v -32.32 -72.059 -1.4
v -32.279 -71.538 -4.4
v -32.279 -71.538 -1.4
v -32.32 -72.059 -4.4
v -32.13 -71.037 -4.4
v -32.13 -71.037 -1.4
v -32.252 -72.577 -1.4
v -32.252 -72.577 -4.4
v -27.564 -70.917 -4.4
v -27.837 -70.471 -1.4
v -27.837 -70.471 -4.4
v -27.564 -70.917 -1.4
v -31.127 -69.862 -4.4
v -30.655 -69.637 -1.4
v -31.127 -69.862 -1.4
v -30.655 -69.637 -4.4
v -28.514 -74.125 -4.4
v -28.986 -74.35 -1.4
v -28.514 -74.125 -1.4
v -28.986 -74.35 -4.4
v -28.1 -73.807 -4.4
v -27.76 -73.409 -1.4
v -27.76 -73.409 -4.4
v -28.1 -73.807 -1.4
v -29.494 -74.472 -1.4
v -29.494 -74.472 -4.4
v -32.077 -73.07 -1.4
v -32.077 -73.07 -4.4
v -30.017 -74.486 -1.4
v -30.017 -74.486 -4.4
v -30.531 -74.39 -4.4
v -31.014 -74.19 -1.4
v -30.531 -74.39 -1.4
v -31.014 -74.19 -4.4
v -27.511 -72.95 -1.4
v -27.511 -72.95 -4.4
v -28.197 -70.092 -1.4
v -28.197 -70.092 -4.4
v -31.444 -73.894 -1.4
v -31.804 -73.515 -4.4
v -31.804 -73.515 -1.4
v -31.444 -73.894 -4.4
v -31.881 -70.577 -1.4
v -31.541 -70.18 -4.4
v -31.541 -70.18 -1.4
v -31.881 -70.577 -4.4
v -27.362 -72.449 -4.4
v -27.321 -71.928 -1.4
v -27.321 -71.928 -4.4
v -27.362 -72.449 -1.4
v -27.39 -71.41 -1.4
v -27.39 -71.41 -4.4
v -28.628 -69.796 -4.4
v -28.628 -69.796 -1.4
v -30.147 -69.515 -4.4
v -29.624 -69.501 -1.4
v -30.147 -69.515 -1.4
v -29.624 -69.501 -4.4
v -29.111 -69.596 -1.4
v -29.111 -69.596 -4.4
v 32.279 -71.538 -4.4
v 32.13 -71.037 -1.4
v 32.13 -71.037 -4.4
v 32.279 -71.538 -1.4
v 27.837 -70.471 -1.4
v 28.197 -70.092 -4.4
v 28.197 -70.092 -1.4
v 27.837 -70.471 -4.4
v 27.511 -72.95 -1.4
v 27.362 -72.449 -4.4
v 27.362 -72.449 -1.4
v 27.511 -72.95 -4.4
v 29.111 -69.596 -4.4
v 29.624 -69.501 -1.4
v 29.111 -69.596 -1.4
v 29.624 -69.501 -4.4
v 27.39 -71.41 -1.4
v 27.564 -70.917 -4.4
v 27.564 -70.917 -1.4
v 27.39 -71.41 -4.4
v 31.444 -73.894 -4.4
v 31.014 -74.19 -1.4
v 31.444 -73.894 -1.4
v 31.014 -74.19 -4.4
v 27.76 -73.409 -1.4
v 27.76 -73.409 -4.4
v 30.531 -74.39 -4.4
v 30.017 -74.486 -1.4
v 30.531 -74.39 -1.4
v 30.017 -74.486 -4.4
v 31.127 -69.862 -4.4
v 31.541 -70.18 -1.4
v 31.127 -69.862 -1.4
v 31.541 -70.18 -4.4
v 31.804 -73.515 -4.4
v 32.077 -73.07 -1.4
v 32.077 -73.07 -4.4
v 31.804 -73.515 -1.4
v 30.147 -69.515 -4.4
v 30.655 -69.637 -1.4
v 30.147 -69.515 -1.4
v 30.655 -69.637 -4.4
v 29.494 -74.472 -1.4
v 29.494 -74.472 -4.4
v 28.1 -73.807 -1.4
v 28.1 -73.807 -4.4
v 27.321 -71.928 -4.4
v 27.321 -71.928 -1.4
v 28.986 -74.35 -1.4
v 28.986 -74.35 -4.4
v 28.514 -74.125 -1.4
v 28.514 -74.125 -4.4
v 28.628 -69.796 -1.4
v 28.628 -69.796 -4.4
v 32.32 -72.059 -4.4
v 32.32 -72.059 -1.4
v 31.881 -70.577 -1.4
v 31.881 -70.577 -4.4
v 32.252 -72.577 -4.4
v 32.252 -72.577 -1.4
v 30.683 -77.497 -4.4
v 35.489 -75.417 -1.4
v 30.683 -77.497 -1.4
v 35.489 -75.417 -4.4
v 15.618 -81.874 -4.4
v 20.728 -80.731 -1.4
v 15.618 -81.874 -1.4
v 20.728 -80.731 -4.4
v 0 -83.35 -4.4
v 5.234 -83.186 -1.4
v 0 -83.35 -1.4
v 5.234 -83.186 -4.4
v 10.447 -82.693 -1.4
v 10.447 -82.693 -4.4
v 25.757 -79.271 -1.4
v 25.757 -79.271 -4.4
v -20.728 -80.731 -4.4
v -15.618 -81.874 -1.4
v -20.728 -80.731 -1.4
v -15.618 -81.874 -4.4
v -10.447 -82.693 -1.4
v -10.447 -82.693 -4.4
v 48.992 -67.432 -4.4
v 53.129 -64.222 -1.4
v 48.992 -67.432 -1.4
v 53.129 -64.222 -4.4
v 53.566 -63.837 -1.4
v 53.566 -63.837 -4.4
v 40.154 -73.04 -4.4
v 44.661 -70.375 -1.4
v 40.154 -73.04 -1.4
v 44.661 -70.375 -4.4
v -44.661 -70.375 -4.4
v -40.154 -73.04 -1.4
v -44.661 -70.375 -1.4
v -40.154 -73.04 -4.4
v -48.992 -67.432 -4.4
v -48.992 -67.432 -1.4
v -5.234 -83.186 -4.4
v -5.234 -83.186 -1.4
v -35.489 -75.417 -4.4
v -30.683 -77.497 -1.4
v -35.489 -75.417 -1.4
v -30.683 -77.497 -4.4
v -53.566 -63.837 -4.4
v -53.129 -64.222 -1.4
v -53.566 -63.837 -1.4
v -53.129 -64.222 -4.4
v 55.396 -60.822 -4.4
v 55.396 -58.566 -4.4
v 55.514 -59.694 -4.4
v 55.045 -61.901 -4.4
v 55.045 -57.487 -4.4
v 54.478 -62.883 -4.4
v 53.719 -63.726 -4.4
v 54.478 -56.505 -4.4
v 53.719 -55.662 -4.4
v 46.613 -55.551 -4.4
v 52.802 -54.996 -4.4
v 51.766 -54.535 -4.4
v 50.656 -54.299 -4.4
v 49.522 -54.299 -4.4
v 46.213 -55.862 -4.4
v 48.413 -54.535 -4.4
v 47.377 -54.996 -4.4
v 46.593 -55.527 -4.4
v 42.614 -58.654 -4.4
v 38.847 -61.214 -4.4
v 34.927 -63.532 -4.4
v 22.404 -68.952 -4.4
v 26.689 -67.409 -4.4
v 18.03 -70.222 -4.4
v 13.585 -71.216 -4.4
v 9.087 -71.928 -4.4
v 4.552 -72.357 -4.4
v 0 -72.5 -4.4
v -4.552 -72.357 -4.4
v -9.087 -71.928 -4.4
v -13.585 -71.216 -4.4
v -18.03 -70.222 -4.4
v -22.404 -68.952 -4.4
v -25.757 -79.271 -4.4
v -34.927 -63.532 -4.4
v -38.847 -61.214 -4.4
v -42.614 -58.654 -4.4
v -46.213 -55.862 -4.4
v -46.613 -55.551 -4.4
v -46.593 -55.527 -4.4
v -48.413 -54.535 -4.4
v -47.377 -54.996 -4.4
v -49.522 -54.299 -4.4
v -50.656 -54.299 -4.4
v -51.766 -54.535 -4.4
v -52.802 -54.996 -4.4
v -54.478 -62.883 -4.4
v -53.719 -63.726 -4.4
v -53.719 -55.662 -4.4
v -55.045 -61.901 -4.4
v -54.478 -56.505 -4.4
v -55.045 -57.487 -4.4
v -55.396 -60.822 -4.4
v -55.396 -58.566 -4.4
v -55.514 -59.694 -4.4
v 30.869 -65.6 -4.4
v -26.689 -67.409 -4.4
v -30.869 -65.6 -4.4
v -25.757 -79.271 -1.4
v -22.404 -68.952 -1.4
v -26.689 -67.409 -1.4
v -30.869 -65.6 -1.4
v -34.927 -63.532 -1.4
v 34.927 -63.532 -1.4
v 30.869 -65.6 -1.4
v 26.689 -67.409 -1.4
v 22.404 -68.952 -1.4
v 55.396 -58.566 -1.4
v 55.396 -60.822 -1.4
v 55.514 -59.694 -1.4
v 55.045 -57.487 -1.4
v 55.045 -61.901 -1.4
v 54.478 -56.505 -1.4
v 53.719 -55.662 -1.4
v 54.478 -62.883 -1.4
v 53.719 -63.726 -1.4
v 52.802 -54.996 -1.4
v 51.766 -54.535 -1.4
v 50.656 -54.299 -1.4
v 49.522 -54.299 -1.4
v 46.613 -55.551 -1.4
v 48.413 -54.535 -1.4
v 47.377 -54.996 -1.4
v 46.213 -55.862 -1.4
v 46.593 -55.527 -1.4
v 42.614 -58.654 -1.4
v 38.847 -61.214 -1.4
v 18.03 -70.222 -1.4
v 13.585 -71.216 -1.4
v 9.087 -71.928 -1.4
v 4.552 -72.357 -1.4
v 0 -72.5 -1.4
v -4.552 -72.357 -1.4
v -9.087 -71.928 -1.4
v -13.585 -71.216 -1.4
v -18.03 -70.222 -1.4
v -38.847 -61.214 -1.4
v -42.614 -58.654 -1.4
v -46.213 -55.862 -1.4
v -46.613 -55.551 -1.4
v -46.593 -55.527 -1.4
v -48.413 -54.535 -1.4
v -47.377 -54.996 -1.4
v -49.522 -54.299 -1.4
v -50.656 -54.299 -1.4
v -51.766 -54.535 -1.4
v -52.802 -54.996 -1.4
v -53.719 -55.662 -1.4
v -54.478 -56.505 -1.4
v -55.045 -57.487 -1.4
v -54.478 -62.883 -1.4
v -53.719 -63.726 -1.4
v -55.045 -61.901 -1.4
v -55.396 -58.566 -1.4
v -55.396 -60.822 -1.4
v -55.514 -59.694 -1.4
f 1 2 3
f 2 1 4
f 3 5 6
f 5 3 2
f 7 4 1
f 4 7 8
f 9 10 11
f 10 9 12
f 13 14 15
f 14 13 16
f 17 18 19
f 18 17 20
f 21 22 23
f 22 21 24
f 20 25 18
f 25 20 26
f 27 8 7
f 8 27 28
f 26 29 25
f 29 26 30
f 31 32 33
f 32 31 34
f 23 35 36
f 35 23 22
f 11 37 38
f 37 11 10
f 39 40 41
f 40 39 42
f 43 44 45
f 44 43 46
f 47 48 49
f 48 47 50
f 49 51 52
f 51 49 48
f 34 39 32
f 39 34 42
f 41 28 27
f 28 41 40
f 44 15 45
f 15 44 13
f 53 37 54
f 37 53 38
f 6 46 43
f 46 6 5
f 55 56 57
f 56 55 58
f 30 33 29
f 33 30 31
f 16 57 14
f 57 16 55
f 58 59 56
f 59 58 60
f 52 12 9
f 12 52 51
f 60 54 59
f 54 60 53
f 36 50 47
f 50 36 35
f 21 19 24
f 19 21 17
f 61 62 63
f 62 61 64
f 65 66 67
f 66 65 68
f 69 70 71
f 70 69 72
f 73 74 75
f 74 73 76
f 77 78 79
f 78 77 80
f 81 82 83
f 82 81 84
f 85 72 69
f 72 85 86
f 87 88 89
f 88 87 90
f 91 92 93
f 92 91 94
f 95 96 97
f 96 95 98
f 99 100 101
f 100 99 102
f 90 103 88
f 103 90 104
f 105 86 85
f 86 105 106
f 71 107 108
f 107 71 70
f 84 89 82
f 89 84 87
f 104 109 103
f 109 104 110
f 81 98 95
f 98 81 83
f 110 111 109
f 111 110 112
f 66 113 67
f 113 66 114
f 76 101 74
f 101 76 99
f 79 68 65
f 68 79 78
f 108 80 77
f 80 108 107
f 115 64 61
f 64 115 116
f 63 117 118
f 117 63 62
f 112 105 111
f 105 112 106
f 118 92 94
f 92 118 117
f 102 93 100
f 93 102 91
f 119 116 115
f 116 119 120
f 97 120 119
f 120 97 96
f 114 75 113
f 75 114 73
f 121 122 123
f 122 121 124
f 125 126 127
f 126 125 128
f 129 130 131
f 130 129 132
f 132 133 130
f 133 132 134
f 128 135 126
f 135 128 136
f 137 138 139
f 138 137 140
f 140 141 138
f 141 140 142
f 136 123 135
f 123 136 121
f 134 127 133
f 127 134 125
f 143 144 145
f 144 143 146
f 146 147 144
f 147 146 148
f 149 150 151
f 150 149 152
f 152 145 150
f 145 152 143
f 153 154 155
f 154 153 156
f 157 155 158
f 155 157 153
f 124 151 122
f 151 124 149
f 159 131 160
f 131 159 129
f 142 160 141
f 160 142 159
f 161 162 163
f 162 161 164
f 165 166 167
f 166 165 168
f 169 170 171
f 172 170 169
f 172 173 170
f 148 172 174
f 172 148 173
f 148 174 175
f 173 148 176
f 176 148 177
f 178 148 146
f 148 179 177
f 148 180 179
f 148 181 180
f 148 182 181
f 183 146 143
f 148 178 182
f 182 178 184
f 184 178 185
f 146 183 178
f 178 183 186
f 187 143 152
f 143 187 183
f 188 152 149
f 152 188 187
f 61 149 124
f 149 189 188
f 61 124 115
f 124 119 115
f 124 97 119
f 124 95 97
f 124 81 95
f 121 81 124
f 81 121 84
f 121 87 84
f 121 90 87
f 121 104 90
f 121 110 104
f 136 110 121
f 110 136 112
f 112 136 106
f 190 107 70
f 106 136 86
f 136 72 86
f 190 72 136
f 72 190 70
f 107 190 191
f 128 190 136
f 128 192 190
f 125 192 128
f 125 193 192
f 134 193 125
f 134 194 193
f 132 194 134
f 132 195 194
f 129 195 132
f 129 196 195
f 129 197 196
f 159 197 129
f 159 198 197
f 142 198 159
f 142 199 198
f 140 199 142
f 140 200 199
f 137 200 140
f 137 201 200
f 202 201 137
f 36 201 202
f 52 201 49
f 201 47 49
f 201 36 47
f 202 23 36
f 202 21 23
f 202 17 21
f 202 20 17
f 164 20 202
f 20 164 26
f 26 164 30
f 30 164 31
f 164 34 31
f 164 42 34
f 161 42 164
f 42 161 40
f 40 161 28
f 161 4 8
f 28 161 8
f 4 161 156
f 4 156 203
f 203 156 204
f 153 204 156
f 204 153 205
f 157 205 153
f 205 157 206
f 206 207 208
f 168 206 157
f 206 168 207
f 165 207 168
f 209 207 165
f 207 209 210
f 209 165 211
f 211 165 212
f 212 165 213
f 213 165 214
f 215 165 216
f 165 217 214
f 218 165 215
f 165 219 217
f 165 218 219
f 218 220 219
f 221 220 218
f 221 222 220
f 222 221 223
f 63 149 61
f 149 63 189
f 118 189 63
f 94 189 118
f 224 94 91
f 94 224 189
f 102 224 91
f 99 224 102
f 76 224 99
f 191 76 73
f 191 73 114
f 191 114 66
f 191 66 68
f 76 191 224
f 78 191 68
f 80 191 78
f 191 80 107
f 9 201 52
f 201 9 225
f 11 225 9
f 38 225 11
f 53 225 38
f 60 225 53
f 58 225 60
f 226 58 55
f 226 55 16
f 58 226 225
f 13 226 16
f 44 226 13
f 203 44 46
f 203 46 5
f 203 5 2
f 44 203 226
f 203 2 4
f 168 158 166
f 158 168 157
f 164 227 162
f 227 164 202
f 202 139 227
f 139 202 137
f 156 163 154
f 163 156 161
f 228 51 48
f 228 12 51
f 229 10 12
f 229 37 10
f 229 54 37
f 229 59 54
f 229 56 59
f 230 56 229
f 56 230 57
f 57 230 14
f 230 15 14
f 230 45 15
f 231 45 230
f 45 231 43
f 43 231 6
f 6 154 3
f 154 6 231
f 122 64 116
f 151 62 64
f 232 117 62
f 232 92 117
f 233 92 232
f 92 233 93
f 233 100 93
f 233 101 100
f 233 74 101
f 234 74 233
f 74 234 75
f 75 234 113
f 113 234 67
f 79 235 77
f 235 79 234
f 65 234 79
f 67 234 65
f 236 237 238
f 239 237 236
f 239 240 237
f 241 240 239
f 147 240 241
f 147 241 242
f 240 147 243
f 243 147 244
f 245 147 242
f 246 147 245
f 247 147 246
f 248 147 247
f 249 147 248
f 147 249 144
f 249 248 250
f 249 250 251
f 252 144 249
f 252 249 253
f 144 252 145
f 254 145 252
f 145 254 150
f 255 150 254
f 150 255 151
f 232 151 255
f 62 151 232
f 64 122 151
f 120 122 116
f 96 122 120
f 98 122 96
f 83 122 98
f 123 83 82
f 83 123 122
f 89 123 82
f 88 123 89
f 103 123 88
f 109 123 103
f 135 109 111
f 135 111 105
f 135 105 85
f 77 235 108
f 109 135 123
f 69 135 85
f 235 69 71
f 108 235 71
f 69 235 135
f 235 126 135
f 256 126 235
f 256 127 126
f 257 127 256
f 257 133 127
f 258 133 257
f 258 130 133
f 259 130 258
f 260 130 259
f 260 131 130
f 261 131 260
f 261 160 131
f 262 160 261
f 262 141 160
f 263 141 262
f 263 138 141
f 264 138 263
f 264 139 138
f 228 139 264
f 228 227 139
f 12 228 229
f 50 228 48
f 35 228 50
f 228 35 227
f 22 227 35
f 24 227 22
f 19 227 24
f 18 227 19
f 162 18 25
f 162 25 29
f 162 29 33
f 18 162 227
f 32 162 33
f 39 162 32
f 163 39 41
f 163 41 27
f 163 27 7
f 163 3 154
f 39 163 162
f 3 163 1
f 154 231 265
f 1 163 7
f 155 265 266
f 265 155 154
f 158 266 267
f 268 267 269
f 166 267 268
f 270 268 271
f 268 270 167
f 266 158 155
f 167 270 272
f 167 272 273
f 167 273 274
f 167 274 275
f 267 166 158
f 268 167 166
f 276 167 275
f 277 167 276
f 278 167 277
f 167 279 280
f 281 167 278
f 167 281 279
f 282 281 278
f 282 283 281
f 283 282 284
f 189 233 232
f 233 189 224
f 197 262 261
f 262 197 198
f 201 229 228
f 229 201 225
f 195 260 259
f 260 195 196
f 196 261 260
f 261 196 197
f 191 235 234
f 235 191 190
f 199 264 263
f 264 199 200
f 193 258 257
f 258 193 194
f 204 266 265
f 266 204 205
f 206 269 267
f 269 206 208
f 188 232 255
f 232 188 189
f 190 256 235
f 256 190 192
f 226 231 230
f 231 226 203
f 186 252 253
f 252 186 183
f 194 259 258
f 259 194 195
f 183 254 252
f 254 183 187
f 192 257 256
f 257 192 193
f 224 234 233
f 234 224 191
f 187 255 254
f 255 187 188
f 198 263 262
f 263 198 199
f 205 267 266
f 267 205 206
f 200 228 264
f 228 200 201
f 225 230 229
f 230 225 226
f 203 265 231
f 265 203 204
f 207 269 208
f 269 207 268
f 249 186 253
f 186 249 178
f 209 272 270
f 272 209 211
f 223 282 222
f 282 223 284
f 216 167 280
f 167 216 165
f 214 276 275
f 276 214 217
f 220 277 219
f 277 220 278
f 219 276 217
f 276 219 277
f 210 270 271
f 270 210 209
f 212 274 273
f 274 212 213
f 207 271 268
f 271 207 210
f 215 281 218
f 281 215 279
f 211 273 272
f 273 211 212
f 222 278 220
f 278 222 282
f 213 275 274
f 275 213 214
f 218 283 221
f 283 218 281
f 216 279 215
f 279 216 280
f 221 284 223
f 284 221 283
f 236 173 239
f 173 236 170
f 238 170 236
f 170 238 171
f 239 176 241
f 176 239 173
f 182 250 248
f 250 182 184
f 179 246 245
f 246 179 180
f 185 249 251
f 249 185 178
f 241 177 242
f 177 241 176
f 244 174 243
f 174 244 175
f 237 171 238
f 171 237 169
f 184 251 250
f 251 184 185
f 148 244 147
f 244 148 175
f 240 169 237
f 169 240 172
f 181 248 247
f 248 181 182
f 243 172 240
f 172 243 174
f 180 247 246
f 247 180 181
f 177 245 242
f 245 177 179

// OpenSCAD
luminaria_d = 174 - 6 + 3 + 1.2 - 1 - 0.5;
pele_d = 160;
pele_z = 0.4;

disco_d = 145;
disco_z = 15;

juntas_z = 15;
juntas_x = 20;
juntas_y = luminaria_d - disco_d;

estrut_z = juntas_z;
estrut_x = 20;
estrut_y = luminaria_d - disco_d;
estrut_n = 4;
estrut_theta_0 = 180 / estrut_n;

moldura_d = 165;
moldura_z = juntas_z;
moldura_x = 20;
moldura_y = luminaria_d - disco_d;
moldura_n = 8;
moldura_theta_0 = 180 / moldura_n;

trava_z = 3;
trava_theta = 80;
trava_d = luminaria_d - 4;

montagem_delta = 0.5;

furos_d = 3.8;

module conexao(){
    difference(){
        intersection(){
            difference(){
                union(){
                    cylinder( d = luminaria_d, h = disco_z, $fn = 100 );
                    
//                    // Juntas para as metades (não cabe inteira na impressora):
//                    translate( [ -juntas_x / 2, -luminaria_d / 2, 0 ] )
//                        cube( [ juntas_x, juntas_y, juntas_z + disco_z ] );
//                    translate( [ -juntas_x / 2, luminaria_d / 2 - juntas_y, 0 ] )
//                        cube( [ juntas_x, juntas_y, juntas_z + disco_z ] );
                    
                    // Abas estruturais para unir moldura ao barril:
                    for ( i = [ 0 : estrut_n - 1 ] )
                            rotate( estrut_theta_0 + 360 / estrut_n * i, [ 0, 0, 1 ] )
                                translate( [ -estrut_x / 2, -luminaria_d / 2, 0 ] )
//                                    cube( [ estrut_x, estrut_y, estrut_z + disco_z ] );
                                    cube( [ estrut_x, estrut_y, estrut_z ] );
    
                    // Abas para unir moldura à pela:
                    for ( i = [ 0 : moldura_n - 1 ] )
                            rotate( moldura_theta_0 + 360 / moldura_n * i, [ 0, 0, 1 ] )
                                translate( [ -moldura_x / 2, -luminaria_d / 2, 0 ] )
//                                    cube( [ moldura_x, moldura_y, moldura_z + disco_z ] );
                                    cube( [ moldura_x, moldura_y, moldura_z ] );
                }
                
                translate( [ 0, 0, -1 ] )
                    cylinder( d = disco_d, h = 100 * disco_z + 2, $fn = 100 );
            
            // Furo para parafusos das emendas de cada metade:
                translate( [ -juntas_x/2 - 1, -( luminaria_d + disco_d ) / 4 + 2, disco_z + juntas_z / 2 + 1 ] )
                    rotate( 90, [ 0, 1, 0 ] )
                        cylinder( d = 3, h = juntas_x + 2, $fn = 30 );
                translate( [ -juntas_x/2 - 1, ( luminaria_d + disco_d ) / 4 - 2, disco_z + juntas_z / 2 + 1 ] )
                    rotate( 90, [ 0, 1, 0 ] )
                        cylinder( d = 3, h = juntas_x + 2, $fn = 30 );
    
            // Furos das abas estruturais para unir moldura ao barril:
            for ( i = [ 0 : estrut_n - 1 ] )
                    rotate( estrut_theta_0 + 360 / estrut_n * i, [ 0, 0, 1 ] )
//                        translate( [0, luminaria_d / 2 + 1, disco_z + estrut_z / 2 ] )
//                        translate( [0, luminaria_d / 2 + 1, disco_z / 2 + estrut_z / 2 ] )
                        translate( [0, luminaria_d / 2 + 1, estrut_z / 2 ] )
                            rotate( 90, [ 1, 0, 0 ] )
                                cylinder( d = furos_d, h = juntas_y + 2, $fn = 30 );
    
            // Furos das abas para unir trava à moldura:
            for ( i = [ 0 : moldura_n - 1 ] )
                    rotate( moldura_theta_0 + 360 / moldura_n * i, [ 0, 0, 1 ] )
                        translate( [0, ( trava_d + disco_d ) / 4, -1 ] )
                            cylinder( d = furos_d, h = juntas_y + 2, $fn = 30 );
            }
            cylinder( d = luminaria_d, h = 100 * disco_z + 2, $fn = 100 );
        }        
    }
}

module conexao_metade(){
    difference(){
        conexao();
    translate( [ 0, -luminaria_d / 2, -1 ] )
        cube( [ luminaria_d, luminaria_d, disco_z + juntas_z + 2 ] );
    }
}

module moldura(){
    translate( [ 0, 0, -trava_z - pele_z - 2 * montagem_delta ] ){
        difference(){
            cylinder( d = trava_d, h = trava_z, $fn = 100 );
            translate( [ 0, 0, -1 ] )
                cylinder( d = disco_d, h = trava_z + 2, $fn = 100 );
            rotate( 90 - trava_theta / 2, [ 0, 0, 1 ] )
                translate( [ -luminaria_d, 0, -1 ] )
                    cube( [ luminaria_d * 2, luminaria_d, disco_z + 2 ] );
            rotate( trava_theta / 2 - 90, [ 0, 0, 1 ] )
                translate( [ -luminaria_d, 0, -1 ] )
                    cube( [ luminaria_d * 2, luminaria_d, disco_z + 2 ] );
                   // Furos das abas para unir trava à moldura:
            for ( i = [ 0 : moldura_n - 1 ] )
                    rotate( moldura_theta_0 + 360 / moldura_n * i, [ 0, 0, 1 ] )
                        translate( [0, ( trava_d + disco_d ) / 4, -1 ] )
                            cylinder( d = 5, h = juntas_y + 2, $fn = 30 );}
        translate( [ -cos( 90 - trava_theta / 2 ) * ( trava_d + disco_d ) / 4, -sin( 90 - trava_theta / 2 ) * ( trava_d + disco_d ) / 4, 0 ] )
            cylinder( d = ( trava_d - disco_d ) / 2, h = trava_z, $fn = 30 );
        translate( [ cos( 90 - trava_theta / 2 ) * ( trava_d + disco_d ) / 4, -sin( 90 - trava_theta / 2 ) * ( trava_d + disco_d ) / 4, 0 ] )
            cylinder( d = ( trava_d - disco_d ) / 2, h = trava_z, $fn = 30 );
   }
}

module pele(){
    translate( [ 0, 0, -pele_z - montagem_delta ] )
        difference(){
            cylinder( d = pele_d, h = pele_z, $fn = 100 );
            
            for ( i = [ 0 : moldura_n - 1 ] )
                    rotate( moldura_theta_0 + 360 / moldura_n * i, [ 0, 0, 1 ] )
                        translate( [0, ( trava_d + disco_d ) / 4, -1 ] )
                            cylinder( d = 5, h = juntas_y + 2, $fn = 30 );
        }
}


//conexao_metade();
moldura();
//pele();

//conexao();
//pele();
